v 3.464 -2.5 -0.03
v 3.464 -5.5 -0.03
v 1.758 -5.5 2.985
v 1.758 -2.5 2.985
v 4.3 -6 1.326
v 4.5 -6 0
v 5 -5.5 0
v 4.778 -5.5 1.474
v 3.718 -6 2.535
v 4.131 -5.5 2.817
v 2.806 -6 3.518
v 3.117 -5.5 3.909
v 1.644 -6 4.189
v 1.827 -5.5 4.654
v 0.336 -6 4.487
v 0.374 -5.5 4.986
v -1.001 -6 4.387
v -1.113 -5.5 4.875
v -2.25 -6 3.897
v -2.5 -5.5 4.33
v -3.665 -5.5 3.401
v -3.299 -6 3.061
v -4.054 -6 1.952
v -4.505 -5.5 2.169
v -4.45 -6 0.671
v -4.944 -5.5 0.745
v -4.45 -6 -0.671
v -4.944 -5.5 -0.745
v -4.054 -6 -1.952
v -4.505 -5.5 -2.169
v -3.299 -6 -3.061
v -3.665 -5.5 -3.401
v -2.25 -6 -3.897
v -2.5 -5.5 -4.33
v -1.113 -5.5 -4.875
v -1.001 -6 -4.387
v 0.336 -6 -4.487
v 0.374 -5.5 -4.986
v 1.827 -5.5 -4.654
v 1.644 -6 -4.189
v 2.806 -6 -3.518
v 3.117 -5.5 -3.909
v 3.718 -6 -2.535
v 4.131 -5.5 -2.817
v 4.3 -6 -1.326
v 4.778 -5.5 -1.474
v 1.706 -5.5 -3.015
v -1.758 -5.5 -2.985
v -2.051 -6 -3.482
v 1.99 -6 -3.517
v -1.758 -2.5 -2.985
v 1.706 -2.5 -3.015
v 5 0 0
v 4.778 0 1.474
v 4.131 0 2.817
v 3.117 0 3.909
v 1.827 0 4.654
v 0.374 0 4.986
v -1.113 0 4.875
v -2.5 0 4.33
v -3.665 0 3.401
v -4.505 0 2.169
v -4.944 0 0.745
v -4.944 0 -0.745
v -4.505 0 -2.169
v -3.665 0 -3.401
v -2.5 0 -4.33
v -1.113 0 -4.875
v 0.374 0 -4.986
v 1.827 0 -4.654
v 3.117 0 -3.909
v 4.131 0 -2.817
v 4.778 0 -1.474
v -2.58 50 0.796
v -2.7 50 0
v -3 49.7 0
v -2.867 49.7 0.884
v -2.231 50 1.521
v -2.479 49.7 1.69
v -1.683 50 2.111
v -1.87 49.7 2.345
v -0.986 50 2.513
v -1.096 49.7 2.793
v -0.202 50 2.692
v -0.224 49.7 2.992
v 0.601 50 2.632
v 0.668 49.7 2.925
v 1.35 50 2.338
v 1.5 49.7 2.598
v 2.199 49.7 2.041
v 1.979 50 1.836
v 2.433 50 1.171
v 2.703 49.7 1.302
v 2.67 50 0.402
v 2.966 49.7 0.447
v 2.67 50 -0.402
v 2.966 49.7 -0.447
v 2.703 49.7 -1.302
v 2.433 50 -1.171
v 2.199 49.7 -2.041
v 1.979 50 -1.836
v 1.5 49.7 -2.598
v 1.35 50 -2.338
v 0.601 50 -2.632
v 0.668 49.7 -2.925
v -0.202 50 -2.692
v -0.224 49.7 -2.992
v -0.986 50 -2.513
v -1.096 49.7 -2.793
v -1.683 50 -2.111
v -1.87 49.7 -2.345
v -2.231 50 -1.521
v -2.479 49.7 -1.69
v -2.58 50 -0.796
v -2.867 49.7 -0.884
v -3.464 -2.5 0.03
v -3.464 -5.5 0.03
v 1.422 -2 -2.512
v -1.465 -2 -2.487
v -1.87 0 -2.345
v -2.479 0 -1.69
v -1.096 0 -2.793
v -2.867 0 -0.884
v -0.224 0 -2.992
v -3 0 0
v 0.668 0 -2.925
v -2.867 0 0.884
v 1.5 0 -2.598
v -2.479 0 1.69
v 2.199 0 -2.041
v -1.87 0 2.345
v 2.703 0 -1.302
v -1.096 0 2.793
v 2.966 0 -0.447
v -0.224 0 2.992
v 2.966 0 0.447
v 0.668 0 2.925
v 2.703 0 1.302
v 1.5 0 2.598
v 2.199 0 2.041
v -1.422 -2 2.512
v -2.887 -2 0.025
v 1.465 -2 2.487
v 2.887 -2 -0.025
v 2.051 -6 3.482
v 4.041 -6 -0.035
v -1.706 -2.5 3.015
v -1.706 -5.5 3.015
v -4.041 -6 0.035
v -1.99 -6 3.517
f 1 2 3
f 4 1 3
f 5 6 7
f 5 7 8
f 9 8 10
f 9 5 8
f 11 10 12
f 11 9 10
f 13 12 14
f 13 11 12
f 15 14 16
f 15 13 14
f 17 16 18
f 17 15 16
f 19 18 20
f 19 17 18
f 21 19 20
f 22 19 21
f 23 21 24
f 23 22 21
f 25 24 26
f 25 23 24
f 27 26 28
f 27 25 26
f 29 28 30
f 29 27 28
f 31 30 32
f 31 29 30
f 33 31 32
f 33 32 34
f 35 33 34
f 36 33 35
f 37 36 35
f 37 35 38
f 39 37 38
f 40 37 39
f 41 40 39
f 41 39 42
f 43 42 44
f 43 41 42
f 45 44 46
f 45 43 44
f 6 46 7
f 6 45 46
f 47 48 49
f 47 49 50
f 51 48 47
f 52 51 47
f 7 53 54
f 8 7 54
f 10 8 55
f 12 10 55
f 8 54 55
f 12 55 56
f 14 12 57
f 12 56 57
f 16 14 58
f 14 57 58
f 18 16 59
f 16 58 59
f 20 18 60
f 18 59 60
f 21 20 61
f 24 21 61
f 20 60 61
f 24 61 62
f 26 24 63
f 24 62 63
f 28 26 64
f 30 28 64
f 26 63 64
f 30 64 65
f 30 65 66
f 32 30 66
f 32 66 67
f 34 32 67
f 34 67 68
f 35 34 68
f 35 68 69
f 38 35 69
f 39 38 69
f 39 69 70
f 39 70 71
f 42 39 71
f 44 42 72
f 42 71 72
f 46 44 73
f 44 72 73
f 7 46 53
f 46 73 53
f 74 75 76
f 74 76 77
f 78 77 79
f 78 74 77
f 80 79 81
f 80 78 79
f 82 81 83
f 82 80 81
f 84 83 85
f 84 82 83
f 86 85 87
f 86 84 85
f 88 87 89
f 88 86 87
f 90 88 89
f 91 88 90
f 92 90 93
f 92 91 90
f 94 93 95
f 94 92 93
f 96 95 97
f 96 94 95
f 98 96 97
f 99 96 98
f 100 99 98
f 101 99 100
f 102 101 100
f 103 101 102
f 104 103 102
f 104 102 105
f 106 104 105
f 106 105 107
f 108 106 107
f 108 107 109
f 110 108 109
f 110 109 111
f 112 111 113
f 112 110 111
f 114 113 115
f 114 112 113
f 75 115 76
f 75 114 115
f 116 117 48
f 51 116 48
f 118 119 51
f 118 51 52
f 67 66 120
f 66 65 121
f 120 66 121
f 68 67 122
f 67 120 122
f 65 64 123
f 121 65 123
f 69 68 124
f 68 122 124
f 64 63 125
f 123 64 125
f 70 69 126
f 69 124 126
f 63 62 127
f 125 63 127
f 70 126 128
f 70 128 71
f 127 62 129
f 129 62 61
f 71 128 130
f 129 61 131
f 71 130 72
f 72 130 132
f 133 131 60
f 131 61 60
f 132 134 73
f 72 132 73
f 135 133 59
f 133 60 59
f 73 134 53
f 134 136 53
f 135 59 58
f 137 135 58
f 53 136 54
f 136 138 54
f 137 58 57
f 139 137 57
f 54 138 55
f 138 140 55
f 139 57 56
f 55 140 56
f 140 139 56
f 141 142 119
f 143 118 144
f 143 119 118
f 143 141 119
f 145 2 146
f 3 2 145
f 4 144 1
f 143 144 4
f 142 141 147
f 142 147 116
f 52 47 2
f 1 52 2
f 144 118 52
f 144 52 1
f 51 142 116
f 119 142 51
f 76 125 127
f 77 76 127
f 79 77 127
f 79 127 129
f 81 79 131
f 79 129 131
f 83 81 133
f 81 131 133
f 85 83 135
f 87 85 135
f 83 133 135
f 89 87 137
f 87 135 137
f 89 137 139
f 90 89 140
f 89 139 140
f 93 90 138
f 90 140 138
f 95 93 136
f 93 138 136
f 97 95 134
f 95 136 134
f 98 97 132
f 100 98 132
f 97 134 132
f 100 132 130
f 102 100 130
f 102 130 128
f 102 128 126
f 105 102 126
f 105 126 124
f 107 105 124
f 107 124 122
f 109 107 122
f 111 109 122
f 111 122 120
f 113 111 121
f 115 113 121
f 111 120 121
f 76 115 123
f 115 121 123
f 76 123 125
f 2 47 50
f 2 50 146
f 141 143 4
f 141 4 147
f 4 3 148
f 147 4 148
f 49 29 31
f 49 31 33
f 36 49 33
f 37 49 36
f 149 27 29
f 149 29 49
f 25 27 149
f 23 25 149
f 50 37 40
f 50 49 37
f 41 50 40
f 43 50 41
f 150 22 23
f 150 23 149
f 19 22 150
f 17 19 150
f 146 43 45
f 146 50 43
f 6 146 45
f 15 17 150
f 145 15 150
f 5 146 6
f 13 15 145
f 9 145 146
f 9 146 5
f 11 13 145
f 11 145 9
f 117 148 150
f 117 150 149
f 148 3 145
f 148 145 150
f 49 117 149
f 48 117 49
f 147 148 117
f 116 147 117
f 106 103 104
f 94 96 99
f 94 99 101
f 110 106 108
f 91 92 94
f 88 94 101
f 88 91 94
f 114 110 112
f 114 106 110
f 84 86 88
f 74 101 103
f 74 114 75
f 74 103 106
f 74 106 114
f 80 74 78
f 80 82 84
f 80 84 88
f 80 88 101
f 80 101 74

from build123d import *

# Parameters (mm, degrees)
F0_R     = 5
F1_DEPTH = 6
F3_DEPTH = 4
F6_SIZE  = 0.5
F7_R     = 3
F4_DEPTH = 50
F5_SIZE  = 0.3


with BuildPart() as f1:
    # F0 (on Front) → F1 (new body)
    with BuildSketch(Plane.XZ):
        Circle(F0_R)
    extrude(amount=F1_DEPTH)

    # F2 (on face) → F3 (cut)
    with BuildSketch(Plane.XZ.offset(6)):
        Polygon((3.4639698148, -0.0302179133), (1.7581543879, 2.9847769009), (-1.7058154268, 3.0149948142), (-3.4639698148, 0.0302179133), (-1.7581543879, -2.9847769009), (1.7058154268, -3.0149948142), align=None)
    extrude(amount=-F3_DEPTH, mode=Mode.SUBTRACT)

    # F6
    f6_edges = [f1.edges().sort_by_distance(p)[0] for p in [
        (-5, -6, 0),
        (2.584893, -2, -1.522606),
        (2.611062, -2, 1.477279),
        (0.026169, -2, 2.999886),
        (-2.584893, -2, 1.522606),
        (-2.611062, -2, -1.477279),
        (-0.026169, -2, -2.999886),
        (-2.584893, -6, 1.522606),
        (-2.611062, -6, -1.477279),
        (0.026169, -6, 2.999886),
        (2.584893, -6, -1.522606),
        (2.611062, -6, 1.477279),
        (-0.026169, -6, -2.999886),
    ]]
    chamfer(f6_edges, length=F6_SIZE)

    # F7 (on face) → F4 (join)
    with BuildSketch(Plane(origin=(0, 0, 0), x_dir=(-1, 0, 0), z_dir=(0, 1, 0))):
        Circle(F7_R)
    extrude(amount=F4_DEPTH)

    # F5
    f5_edges = [f1.edges().sort_by_distance(p)[0] for p in [
        (3, 50, 0),
    ]]
    chamfer(f5_edges, length=F5_SIZE)


solid = f1.part
